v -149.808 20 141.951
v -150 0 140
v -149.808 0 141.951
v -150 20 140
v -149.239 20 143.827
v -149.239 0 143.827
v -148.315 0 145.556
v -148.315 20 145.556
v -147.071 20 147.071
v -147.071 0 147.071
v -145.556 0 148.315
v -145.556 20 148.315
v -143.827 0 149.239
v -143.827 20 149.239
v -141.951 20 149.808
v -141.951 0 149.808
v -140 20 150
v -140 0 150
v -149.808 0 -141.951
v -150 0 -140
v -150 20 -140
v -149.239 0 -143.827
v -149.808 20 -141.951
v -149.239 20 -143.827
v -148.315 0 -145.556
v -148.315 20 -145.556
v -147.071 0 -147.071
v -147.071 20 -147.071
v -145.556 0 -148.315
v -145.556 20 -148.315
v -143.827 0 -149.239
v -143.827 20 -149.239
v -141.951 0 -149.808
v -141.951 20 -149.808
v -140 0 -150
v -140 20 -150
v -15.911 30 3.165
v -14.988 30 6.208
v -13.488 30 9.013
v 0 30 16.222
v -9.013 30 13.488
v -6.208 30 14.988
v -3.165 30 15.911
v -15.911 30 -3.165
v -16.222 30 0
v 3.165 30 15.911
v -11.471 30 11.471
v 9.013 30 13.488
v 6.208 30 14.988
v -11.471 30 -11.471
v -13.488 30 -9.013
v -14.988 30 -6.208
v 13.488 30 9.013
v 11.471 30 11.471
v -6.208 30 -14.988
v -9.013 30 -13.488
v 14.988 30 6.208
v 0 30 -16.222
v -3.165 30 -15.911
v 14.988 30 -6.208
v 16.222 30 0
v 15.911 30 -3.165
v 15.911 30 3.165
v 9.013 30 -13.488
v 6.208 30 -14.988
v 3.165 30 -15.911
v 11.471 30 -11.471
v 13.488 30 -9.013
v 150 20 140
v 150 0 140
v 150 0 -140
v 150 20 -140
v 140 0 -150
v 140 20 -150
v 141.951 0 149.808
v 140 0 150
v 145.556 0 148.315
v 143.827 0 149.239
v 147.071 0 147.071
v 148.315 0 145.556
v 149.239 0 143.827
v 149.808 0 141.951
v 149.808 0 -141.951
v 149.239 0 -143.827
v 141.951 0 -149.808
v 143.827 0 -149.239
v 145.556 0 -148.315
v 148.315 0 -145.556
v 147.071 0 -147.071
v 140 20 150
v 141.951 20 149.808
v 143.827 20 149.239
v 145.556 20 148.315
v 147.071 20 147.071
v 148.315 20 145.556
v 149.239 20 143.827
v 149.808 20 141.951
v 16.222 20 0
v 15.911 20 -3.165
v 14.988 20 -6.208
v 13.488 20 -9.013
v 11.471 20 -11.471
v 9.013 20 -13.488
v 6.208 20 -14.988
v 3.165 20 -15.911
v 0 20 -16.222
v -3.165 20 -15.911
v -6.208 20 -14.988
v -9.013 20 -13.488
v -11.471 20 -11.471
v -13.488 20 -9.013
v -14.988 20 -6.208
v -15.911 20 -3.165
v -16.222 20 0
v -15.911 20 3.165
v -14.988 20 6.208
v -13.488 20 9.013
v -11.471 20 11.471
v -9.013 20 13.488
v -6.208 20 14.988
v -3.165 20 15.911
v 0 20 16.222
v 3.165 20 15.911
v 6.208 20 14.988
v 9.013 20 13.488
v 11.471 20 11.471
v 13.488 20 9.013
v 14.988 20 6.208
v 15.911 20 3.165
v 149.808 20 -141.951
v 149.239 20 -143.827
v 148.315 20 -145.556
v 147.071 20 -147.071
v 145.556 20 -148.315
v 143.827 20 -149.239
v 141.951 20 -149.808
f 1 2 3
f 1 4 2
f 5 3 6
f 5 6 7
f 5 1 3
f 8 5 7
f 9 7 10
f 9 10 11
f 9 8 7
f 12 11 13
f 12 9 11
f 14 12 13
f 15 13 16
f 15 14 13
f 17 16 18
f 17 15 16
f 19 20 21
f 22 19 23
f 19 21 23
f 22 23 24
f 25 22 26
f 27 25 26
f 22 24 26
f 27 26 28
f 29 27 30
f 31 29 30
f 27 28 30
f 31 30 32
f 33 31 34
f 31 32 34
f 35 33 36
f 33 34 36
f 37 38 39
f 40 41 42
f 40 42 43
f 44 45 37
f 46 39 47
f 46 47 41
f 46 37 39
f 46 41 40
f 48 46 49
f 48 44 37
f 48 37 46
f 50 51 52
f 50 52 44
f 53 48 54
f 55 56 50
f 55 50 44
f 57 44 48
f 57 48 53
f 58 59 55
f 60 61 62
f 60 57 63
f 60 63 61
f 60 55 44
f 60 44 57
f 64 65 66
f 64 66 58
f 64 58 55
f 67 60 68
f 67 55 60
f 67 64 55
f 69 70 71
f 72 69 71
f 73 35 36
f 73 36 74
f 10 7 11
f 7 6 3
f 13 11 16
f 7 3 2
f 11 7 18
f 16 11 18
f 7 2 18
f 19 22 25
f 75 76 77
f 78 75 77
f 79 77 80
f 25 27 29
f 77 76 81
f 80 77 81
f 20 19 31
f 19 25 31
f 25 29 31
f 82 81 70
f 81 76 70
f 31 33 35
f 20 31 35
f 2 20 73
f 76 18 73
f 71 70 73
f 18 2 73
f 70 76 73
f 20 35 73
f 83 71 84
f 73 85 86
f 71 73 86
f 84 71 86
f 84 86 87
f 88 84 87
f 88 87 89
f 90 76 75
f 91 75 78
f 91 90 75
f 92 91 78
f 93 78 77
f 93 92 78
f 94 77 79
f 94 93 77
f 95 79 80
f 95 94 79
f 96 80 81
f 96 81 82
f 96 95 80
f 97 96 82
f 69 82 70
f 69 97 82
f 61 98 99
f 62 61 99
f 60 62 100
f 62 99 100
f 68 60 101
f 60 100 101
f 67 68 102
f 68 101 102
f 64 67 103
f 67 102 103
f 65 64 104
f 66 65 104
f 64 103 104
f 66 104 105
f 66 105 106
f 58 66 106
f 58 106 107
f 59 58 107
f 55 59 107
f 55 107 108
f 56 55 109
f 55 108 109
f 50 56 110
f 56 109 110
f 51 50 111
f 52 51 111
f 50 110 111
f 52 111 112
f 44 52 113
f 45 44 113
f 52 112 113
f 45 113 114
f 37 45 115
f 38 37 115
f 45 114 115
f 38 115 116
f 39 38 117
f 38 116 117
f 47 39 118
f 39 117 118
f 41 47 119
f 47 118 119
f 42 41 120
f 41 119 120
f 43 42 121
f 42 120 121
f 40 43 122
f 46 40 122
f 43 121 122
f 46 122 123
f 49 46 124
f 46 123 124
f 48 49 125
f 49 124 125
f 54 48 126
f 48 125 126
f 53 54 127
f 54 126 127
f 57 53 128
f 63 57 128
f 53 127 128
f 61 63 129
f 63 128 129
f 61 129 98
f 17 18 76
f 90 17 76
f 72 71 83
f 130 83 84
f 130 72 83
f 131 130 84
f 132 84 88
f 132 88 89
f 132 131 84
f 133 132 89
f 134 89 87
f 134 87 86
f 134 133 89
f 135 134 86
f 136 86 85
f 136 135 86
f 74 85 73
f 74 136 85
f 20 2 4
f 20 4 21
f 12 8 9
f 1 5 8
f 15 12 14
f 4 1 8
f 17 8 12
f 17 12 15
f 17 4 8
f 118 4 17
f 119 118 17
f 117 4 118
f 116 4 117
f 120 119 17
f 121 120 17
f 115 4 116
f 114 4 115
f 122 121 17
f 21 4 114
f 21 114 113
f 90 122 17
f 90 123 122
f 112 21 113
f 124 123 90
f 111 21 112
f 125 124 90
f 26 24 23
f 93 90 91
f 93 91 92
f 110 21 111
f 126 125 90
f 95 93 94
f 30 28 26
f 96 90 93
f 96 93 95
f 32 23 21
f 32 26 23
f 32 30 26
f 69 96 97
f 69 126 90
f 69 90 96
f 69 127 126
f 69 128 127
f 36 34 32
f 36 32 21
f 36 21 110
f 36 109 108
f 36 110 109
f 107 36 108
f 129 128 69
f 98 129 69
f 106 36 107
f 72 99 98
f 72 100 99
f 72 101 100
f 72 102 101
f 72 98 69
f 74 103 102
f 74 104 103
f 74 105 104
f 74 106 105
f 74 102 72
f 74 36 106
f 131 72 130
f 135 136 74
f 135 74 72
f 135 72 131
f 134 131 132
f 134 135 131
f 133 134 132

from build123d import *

# Parameters (mm, degrees)
SKETCH1_W           = 300
SKETCH1_H           = 300
BOSS_EXTRUDE1_DEPTH = 20
FILLET1_R           = 10
SKETCH2_R           = 16.222477604
BOSS_EXTRUDE2_DEPTH = 10


with BuildPart() as part:
    # Sketch1 → Boss-Extrude1 (new body)
    with BuildSketch(Plane(origin=(0, 0, 0), x_dir=(1, 0, 0), z_dir=(0, 1, 0))):
        Rectangle(SKETCH1_W, SKETCH1_H)
    extrude(amount=BOSS_EXTRUDE1_DEPTH)

    # Fillet1
    fillet1_edges = [part.edges().sort_by_distance(p)[0] for p in [
        (150, 10, 150),
        (-150, 10, 150),
        (-150, 10, -150),
        (150, 10, -150),
    ]]
    fillet(fillet1_edges, radius=FILLET1_R)

    # Sketch2 → Boss-Extrude2 (add)
    with BuildSketch(Plane(origin=(0, 20, 0), x_dir=(1, 0, 0), z_dir=(0, 1, 0))):
        Circle(SKETCH2_R)
    extrude(amount=BOSS_EXTRUDE2_DEPTH)


solid = part.part
